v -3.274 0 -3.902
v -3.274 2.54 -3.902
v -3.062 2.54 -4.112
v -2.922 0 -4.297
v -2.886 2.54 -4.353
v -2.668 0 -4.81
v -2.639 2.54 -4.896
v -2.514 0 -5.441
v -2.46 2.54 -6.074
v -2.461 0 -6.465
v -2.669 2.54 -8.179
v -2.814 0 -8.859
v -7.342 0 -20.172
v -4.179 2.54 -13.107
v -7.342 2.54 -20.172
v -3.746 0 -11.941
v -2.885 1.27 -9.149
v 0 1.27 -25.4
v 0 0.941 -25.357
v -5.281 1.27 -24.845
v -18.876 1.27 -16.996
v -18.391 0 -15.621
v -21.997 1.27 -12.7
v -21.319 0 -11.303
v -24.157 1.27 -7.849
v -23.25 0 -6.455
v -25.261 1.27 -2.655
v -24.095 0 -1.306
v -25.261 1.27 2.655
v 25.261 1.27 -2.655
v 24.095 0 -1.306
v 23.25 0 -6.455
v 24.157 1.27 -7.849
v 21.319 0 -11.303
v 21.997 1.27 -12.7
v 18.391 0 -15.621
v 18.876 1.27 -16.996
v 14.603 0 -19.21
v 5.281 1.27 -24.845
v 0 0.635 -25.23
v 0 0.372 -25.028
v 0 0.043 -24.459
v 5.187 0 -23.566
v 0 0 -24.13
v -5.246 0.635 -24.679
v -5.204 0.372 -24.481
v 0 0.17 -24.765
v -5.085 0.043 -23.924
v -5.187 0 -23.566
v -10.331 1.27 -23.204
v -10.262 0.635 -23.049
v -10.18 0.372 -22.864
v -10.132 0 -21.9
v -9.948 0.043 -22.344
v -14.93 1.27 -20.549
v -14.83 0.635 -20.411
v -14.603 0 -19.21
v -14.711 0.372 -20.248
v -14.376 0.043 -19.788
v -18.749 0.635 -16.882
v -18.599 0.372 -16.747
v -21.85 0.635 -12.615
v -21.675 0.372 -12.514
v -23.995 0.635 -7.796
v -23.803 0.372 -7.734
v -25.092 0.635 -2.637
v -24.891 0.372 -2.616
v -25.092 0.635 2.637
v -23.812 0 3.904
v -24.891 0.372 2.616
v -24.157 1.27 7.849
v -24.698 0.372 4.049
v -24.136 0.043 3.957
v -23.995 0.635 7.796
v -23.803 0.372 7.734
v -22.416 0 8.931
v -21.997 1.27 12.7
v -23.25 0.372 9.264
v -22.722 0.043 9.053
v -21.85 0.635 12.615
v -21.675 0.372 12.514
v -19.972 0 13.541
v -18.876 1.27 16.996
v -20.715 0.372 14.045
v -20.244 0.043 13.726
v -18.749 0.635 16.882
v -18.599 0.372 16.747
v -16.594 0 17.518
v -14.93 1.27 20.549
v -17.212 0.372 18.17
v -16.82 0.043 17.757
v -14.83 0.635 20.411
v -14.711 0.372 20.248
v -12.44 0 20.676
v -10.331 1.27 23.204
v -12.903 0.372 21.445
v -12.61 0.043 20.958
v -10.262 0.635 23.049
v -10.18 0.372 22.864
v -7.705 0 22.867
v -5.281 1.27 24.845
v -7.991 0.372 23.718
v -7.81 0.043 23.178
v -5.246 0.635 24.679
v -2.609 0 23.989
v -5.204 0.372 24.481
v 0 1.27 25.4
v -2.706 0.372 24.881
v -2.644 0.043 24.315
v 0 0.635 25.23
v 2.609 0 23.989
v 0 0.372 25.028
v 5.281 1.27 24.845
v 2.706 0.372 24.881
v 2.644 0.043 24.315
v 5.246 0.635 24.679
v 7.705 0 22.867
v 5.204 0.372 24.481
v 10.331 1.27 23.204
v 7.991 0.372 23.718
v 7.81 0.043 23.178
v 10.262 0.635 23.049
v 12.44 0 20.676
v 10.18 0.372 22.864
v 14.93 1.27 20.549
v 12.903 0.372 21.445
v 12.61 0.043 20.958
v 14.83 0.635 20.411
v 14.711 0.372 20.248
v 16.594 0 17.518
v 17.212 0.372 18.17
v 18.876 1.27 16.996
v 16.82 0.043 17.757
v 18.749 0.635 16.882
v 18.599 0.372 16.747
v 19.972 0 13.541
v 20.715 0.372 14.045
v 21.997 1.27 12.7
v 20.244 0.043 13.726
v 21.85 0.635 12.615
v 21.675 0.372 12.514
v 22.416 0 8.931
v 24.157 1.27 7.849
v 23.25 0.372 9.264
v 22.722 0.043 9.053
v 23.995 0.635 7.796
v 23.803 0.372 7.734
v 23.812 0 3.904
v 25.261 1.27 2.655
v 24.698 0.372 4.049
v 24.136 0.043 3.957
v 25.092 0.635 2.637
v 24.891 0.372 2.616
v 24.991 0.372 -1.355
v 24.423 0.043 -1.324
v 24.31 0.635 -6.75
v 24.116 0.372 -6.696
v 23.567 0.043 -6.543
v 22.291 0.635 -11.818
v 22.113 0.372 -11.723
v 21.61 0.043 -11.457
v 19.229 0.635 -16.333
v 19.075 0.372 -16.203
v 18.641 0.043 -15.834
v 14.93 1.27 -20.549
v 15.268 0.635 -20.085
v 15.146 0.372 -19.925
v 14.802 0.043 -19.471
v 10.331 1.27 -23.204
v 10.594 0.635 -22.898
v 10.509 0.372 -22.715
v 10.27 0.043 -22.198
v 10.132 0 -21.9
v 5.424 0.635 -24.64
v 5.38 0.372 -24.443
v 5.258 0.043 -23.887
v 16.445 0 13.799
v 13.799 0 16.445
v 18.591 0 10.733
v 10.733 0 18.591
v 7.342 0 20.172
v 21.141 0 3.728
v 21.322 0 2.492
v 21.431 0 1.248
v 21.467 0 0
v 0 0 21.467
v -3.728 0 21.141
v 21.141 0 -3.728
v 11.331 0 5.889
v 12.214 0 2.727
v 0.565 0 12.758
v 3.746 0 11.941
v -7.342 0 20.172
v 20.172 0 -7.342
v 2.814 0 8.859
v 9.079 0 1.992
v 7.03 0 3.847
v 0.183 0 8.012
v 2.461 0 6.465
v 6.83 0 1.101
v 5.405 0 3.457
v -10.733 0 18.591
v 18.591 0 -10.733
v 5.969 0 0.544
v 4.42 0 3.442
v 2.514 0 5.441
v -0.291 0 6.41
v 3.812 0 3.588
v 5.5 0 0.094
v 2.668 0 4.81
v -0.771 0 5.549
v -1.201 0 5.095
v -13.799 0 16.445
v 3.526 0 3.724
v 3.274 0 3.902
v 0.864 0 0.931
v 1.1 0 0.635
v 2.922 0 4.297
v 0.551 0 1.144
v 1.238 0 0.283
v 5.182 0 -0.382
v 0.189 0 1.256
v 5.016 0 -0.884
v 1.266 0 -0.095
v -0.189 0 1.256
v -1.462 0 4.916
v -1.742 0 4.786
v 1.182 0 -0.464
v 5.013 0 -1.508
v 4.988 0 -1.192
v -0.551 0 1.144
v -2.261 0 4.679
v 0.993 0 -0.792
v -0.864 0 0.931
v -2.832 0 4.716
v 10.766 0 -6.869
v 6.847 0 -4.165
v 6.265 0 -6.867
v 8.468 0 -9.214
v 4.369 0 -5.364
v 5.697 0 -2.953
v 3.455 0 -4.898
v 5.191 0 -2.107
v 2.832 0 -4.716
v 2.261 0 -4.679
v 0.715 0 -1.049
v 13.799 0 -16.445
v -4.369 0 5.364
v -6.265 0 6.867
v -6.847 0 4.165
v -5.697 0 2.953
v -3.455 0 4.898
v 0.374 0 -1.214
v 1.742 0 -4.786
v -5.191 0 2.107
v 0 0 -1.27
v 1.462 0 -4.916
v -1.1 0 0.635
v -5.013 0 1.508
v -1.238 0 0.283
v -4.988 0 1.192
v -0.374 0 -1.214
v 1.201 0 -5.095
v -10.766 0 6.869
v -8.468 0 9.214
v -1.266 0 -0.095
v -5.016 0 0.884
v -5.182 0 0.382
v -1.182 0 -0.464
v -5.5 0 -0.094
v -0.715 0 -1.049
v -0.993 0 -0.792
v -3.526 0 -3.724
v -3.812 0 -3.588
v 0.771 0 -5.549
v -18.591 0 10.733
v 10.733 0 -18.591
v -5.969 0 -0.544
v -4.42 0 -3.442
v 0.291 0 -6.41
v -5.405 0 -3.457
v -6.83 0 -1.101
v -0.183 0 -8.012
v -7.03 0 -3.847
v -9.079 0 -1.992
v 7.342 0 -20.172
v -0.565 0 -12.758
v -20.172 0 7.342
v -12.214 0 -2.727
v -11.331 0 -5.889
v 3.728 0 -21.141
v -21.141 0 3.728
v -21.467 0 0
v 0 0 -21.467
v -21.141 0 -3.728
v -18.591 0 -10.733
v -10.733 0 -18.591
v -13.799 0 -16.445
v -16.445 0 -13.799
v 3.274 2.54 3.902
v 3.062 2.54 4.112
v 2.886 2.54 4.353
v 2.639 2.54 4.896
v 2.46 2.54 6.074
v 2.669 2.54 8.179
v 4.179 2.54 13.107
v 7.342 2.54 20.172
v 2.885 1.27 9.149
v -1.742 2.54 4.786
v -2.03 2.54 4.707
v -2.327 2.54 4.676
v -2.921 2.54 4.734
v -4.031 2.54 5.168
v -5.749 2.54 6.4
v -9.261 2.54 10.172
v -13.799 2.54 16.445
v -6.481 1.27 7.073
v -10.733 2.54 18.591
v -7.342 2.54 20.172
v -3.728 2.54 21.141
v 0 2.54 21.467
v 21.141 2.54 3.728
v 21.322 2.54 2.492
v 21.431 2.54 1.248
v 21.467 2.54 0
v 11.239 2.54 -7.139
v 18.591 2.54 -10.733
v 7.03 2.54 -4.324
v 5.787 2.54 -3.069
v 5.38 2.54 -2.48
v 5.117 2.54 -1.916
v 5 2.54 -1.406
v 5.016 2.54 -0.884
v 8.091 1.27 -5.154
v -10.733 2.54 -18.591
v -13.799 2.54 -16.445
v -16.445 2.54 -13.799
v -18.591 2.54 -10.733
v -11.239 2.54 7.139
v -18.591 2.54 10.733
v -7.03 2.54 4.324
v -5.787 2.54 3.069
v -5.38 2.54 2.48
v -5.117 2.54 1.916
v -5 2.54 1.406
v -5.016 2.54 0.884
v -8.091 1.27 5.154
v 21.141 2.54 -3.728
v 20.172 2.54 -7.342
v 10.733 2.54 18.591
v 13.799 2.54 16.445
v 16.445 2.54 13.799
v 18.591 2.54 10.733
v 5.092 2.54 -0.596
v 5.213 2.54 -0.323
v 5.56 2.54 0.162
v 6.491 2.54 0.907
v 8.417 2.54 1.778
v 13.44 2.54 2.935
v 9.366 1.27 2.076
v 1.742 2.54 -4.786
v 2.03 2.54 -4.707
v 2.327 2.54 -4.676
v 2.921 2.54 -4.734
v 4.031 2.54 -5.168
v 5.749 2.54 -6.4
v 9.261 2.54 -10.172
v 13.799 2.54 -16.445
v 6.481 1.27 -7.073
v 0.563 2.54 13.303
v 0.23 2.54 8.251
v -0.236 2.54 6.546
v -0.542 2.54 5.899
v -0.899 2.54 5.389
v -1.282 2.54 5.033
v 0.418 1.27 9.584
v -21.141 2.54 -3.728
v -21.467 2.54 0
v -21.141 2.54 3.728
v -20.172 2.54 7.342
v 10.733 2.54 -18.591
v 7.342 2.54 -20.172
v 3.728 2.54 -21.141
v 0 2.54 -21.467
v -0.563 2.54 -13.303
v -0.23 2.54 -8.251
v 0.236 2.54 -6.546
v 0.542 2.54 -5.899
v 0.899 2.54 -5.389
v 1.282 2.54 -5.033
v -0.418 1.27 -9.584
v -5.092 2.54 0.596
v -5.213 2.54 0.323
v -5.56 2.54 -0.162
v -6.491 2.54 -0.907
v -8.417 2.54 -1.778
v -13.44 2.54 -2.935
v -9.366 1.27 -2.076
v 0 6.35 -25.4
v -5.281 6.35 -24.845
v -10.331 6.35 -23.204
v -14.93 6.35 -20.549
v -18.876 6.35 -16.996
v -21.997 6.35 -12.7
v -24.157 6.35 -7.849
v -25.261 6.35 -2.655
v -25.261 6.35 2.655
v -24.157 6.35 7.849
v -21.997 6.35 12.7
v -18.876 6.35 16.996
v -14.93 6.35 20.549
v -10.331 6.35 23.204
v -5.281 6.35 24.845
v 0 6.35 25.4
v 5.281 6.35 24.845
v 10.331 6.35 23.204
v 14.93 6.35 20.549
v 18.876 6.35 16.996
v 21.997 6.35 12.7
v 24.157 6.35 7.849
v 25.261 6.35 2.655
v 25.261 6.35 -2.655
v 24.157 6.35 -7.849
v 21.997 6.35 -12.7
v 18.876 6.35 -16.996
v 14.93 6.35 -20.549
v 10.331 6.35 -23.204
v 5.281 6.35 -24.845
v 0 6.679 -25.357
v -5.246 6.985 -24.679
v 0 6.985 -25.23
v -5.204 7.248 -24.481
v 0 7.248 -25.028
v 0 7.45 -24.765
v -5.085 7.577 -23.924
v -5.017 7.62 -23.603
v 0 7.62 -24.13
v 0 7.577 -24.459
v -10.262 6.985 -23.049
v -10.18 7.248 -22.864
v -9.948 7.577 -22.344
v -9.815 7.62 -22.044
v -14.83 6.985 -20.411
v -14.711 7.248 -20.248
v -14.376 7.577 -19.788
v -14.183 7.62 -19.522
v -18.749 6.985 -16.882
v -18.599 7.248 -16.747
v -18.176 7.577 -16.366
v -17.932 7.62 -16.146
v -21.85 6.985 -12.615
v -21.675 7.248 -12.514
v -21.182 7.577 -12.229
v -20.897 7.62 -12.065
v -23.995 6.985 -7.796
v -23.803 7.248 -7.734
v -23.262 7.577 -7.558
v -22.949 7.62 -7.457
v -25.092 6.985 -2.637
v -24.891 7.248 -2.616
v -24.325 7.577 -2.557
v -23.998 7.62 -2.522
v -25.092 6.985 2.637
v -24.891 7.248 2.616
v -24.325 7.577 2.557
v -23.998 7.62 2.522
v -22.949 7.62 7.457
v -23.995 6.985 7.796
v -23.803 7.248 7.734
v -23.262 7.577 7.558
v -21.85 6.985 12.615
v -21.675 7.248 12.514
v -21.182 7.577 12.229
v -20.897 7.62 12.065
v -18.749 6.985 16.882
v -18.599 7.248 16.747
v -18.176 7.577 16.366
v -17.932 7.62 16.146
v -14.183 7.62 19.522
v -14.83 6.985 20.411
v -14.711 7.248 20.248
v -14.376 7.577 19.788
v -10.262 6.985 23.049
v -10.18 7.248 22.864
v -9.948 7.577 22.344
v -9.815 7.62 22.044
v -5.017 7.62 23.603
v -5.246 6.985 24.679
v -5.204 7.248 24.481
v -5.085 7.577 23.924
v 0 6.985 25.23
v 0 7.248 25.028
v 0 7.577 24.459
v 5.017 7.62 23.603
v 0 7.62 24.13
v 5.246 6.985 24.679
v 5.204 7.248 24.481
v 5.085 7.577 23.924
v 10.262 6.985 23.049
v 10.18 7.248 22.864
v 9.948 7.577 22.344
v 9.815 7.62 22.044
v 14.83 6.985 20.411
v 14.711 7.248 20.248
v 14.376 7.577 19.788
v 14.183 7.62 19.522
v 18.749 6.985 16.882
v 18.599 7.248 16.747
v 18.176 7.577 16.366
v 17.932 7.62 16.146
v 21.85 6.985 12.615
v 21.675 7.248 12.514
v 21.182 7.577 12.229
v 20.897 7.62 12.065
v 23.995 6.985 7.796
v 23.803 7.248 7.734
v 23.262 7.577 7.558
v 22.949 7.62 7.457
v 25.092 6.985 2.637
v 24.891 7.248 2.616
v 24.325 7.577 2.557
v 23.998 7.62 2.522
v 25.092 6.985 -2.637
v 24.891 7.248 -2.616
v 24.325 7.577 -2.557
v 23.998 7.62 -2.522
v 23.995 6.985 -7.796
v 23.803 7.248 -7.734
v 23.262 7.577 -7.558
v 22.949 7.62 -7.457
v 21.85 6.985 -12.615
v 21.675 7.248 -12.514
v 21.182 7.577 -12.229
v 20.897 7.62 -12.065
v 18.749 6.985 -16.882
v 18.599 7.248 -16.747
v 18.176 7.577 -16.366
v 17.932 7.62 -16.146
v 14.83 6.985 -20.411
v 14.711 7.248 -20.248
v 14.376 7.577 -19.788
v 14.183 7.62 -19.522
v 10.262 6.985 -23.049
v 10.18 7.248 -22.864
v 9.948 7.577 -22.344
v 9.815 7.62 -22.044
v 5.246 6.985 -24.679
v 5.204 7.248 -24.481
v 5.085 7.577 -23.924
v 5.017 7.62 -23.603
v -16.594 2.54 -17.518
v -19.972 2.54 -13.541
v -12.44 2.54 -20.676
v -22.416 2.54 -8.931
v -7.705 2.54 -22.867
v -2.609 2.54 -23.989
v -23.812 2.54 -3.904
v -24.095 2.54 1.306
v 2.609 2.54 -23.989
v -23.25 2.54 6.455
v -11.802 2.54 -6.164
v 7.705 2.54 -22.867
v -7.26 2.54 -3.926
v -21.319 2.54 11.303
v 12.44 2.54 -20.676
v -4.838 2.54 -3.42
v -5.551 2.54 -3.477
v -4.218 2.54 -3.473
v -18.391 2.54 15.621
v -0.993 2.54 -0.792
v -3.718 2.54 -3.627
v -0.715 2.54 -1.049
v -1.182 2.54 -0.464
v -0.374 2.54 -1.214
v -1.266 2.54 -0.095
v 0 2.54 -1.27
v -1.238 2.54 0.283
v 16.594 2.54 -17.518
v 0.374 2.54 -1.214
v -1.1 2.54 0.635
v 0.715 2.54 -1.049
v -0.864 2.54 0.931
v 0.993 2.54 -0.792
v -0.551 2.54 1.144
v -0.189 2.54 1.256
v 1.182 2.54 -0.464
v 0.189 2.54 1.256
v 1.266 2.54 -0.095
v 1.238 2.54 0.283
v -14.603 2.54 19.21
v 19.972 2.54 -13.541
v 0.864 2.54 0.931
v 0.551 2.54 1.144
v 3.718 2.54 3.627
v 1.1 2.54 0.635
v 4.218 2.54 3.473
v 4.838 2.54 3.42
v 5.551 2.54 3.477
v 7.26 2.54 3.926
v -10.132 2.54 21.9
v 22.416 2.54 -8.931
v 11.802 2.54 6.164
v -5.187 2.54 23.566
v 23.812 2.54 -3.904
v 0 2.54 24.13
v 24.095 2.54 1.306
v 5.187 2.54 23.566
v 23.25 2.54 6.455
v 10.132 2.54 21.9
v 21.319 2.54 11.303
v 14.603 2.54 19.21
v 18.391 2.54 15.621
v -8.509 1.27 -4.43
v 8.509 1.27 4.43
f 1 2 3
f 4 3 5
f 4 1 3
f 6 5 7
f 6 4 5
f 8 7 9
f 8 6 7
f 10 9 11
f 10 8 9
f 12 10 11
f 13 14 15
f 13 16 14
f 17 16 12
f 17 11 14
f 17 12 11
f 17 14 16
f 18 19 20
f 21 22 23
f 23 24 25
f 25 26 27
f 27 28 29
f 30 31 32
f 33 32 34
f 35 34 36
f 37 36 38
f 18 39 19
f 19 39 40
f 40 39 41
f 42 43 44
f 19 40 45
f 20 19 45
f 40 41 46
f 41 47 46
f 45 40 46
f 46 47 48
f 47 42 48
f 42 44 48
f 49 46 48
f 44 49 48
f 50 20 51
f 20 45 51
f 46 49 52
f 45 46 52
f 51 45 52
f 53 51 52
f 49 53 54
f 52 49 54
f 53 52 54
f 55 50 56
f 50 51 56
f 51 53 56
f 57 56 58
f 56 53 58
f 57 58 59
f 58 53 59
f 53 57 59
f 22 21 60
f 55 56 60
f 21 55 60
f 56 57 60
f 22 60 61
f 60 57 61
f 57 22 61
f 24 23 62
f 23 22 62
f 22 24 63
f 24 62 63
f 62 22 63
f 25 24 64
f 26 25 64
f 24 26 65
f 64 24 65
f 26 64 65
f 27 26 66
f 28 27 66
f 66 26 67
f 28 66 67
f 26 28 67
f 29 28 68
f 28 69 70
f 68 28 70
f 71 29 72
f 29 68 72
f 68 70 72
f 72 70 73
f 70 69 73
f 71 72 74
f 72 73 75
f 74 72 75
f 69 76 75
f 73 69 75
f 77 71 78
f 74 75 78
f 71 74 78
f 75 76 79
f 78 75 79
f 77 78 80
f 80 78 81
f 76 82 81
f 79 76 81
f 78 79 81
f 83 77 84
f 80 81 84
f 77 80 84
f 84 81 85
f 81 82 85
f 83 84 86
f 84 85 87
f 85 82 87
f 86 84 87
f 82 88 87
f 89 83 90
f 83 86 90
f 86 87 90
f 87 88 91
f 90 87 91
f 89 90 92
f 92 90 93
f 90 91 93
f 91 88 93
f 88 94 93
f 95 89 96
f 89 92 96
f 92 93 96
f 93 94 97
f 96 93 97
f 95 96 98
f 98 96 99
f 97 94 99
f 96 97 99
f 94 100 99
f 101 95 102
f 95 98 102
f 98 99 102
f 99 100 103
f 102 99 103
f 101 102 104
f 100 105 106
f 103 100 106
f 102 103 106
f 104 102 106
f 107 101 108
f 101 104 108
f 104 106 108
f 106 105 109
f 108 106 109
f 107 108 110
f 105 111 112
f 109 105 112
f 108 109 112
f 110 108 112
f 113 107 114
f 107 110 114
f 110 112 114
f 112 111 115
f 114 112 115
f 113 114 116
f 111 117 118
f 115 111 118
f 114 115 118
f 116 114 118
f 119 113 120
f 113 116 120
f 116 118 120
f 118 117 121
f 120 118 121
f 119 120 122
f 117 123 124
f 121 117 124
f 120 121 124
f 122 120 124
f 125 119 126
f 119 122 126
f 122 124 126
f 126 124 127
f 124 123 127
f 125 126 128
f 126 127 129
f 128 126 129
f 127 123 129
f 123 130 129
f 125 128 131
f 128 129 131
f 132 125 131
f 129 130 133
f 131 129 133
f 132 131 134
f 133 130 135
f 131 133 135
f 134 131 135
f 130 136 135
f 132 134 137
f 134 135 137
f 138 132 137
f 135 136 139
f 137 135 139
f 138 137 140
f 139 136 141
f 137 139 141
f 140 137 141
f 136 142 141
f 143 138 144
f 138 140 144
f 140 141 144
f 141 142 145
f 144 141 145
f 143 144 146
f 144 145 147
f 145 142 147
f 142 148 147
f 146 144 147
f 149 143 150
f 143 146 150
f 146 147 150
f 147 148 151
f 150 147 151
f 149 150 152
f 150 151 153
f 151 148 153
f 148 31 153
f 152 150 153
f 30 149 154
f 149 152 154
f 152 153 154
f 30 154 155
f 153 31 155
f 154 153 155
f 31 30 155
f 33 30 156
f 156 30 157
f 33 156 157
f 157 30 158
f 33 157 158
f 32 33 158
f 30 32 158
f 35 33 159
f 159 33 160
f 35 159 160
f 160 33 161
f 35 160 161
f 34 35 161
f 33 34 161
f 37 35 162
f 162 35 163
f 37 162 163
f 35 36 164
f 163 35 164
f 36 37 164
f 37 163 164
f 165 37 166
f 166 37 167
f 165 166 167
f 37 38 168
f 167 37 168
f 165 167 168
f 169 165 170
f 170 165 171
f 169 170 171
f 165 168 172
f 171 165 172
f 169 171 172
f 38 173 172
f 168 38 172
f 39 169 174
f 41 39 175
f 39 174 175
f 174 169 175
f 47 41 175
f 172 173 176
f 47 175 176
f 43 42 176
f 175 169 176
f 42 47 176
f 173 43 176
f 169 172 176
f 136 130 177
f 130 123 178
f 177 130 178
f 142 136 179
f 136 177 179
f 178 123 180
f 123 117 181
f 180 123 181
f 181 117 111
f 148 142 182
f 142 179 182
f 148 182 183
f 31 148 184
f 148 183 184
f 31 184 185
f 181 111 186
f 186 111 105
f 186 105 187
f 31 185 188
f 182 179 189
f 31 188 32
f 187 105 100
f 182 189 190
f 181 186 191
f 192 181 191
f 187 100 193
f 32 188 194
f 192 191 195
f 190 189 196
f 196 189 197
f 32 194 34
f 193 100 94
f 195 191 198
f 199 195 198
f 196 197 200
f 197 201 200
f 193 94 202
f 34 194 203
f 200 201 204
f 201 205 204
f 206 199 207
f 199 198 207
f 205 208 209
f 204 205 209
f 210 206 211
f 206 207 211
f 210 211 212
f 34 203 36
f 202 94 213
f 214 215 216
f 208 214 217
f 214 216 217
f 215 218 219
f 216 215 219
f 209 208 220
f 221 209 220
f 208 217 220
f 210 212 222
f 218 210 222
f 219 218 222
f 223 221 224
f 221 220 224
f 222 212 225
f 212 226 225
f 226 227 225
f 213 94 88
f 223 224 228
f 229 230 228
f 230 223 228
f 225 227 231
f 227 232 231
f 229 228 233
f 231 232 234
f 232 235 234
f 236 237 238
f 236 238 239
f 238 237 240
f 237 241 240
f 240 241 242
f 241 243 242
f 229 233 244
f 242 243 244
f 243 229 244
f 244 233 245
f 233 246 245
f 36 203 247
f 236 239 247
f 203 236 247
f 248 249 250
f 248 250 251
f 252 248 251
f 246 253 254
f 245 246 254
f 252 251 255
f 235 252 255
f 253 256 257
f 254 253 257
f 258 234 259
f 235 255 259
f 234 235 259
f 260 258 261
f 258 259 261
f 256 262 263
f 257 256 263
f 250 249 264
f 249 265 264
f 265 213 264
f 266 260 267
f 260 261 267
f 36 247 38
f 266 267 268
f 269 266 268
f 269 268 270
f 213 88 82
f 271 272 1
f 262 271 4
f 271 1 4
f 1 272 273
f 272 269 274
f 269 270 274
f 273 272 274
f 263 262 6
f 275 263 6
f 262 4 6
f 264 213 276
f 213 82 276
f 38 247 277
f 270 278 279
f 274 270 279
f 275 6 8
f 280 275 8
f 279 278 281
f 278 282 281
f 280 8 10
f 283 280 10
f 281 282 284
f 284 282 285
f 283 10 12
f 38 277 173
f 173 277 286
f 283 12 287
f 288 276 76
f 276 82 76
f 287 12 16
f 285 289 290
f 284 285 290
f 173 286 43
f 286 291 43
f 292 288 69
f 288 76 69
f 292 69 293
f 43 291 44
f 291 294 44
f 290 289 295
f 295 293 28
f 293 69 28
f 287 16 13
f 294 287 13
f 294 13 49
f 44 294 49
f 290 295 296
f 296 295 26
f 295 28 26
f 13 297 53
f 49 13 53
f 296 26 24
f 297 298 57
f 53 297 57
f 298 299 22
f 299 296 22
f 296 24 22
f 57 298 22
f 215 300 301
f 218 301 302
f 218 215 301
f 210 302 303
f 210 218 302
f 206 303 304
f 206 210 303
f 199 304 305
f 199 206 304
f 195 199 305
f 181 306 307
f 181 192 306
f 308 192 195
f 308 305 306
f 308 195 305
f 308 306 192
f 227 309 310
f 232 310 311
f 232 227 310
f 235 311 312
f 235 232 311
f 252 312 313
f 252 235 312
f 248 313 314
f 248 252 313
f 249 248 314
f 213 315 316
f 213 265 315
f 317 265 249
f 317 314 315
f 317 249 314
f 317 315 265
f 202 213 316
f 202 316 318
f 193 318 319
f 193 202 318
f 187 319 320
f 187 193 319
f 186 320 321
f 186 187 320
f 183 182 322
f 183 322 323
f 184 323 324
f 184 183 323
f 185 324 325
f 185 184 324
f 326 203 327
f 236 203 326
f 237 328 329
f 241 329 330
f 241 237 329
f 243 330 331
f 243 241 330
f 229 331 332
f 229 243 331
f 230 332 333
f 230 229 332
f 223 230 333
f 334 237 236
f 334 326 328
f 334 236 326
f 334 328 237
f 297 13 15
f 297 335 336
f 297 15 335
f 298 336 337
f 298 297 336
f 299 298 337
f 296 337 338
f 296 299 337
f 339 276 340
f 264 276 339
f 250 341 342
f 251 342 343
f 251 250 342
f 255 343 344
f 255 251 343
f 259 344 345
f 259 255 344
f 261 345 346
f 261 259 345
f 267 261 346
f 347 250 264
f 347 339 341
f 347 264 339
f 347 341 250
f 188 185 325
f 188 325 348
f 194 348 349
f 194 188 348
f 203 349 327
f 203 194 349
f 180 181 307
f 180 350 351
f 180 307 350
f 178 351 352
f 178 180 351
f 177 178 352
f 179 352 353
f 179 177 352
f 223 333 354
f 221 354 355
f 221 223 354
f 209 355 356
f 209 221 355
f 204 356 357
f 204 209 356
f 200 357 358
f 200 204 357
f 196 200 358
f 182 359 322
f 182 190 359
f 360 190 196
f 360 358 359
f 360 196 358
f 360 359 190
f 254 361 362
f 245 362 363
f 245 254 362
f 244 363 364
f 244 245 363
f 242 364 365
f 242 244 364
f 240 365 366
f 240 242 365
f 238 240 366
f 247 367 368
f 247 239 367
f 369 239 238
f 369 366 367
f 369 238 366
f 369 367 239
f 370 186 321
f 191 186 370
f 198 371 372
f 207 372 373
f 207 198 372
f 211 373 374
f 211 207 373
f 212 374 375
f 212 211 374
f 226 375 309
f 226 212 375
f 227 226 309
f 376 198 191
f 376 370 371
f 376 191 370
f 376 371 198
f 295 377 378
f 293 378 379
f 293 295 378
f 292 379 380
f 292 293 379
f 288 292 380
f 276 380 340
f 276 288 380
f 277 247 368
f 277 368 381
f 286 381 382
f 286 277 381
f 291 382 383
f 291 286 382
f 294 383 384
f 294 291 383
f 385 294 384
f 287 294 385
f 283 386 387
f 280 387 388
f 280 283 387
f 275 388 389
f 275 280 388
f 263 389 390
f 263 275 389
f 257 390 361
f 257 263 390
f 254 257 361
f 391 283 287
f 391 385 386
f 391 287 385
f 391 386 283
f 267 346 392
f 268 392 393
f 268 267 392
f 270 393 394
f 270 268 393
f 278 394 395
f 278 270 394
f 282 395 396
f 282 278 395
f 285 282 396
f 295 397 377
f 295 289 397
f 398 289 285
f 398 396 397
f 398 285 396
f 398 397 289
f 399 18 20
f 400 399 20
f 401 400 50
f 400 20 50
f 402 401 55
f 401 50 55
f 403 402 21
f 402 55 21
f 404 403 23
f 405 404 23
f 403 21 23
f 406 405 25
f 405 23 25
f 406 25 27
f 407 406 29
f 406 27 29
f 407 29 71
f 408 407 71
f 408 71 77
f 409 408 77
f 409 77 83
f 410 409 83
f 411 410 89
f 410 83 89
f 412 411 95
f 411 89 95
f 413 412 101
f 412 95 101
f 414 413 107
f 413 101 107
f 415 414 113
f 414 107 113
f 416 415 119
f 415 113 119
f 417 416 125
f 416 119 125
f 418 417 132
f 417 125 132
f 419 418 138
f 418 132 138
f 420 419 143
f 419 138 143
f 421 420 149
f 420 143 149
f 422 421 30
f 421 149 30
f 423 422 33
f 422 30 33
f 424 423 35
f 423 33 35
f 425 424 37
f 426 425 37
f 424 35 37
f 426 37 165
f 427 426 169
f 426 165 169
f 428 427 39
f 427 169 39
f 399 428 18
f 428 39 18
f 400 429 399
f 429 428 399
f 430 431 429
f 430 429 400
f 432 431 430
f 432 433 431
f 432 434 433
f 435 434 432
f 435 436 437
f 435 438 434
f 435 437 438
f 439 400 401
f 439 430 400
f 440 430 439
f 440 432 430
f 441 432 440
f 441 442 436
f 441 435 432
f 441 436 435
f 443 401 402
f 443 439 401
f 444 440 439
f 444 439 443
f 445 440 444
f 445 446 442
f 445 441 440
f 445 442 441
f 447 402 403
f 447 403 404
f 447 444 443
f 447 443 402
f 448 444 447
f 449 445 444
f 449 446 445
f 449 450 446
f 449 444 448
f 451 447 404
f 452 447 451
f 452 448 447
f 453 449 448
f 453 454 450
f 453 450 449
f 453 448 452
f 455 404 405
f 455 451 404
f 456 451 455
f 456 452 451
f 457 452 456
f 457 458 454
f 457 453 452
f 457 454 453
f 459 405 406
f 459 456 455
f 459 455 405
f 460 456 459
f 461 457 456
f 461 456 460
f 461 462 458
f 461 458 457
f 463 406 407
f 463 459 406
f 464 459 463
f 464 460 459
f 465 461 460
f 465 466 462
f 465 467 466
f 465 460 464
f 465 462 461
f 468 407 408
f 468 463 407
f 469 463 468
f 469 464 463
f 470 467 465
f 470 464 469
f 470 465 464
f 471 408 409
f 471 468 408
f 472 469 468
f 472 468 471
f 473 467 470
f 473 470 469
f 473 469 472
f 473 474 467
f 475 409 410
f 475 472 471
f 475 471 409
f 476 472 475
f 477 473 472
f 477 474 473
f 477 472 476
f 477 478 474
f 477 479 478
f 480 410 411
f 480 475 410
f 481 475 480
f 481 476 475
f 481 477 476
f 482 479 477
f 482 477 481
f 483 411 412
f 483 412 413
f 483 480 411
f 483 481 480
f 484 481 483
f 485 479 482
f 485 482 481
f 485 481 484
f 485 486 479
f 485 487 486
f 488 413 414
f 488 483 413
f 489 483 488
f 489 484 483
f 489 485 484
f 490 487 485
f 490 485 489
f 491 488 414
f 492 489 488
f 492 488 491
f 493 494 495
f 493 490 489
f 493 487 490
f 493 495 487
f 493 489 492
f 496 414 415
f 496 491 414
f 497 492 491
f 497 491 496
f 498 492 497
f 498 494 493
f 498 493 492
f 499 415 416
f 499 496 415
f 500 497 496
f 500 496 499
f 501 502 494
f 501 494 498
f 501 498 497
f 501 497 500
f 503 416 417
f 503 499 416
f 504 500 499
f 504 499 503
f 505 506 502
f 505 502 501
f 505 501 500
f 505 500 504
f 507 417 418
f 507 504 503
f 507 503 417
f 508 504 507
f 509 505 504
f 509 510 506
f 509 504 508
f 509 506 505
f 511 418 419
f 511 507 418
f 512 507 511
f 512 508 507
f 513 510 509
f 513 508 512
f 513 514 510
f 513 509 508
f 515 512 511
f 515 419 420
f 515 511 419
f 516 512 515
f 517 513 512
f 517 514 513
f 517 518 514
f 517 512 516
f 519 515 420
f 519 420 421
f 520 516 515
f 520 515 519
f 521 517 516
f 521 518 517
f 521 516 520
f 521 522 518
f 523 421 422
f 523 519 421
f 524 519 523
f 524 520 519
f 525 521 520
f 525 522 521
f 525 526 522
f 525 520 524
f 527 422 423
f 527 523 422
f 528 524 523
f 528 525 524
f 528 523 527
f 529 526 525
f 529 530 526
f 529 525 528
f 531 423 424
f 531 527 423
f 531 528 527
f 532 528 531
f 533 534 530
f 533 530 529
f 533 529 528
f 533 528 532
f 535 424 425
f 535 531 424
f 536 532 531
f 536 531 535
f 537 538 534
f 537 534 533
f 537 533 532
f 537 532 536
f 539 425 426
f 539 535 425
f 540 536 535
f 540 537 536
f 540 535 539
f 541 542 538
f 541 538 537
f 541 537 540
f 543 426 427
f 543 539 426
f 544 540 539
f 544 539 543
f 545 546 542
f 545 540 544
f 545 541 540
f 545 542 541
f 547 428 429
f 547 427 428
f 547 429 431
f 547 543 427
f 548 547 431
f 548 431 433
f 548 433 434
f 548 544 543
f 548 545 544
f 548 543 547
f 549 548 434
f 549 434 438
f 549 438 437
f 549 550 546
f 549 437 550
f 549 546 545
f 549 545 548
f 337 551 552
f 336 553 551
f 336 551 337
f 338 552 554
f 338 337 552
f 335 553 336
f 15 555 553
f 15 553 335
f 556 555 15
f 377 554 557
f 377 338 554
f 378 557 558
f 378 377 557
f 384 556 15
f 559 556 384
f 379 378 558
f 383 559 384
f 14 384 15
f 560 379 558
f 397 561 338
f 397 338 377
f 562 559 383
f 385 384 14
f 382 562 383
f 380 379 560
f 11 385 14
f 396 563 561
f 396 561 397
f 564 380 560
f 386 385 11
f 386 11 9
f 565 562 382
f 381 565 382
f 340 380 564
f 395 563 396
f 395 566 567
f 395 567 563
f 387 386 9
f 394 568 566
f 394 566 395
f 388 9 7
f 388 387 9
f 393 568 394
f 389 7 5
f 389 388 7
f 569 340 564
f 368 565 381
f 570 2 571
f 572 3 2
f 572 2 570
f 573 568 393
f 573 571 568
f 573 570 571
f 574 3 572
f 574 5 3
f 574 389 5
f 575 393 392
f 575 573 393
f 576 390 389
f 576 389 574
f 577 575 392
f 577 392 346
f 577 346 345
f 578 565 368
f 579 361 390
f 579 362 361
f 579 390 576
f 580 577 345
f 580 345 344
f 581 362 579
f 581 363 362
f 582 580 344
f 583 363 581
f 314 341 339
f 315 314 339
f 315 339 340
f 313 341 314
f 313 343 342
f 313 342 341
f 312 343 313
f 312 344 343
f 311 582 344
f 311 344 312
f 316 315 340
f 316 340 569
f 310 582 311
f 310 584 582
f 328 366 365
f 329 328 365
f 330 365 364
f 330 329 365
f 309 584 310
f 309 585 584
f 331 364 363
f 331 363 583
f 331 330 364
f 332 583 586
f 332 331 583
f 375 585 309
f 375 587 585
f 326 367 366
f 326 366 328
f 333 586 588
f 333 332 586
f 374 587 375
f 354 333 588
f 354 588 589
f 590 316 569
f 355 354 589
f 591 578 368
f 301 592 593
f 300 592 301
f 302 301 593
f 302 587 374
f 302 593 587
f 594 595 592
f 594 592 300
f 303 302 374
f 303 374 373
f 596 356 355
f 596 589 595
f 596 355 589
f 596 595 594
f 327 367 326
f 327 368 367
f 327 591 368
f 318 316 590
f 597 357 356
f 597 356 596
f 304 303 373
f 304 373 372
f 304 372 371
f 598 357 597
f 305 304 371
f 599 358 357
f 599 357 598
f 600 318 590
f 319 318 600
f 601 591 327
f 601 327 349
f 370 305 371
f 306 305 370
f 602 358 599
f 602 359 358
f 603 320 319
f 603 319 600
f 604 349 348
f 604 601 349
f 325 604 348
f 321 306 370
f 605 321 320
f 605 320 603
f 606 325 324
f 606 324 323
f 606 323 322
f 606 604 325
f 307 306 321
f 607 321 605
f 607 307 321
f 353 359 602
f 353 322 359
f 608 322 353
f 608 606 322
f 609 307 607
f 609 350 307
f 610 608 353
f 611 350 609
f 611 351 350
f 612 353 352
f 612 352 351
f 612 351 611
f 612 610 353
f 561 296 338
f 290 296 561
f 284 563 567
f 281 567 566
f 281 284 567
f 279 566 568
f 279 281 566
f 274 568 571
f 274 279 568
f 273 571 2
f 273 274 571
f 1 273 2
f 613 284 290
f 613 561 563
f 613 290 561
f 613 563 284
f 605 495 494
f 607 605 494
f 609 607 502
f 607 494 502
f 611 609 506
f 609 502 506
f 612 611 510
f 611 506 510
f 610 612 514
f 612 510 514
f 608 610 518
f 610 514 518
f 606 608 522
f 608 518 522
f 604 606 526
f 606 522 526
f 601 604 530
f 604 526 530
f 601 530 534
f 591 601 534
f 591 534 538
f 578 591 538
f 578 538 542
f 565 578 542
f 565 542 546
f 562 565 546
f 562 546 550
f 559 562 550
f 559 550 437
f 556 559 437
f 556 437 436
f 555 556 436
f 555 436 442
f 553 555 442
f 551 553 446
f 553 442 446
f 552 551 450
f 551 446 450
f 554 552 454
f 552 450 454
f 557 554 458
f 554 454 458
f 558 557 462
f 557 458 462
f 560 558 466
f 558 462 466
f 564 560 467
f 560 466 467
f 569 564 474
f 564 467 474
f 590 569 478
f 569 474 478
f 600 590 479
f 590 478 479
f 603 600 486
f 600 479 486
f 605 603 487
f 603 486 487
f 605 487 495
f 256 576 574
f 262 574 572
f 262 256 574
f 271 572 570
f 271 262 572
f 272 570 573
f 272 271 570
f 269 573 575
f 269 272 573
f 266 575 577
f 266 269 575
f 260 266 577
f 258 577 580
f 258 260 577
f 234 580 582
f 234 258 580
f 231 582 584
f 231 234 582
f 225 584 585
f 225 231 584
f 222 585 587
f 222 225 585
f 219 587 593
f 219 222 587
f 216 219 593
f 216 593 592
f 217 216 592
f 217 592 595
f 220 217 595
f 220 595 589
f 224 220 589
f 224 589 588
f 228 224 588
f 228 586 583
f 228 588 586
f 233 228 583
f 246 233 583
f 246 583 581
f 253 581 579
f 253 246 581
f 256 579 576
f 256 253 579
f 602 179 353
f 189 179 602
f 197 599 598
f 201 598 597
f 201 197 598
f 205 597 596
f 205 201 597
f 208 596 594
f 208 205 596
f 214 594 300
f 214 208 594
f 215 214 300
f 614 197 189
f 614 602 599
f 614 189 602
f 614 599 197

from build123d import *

# Parameters (mm, degrees)
SKETCH1_R           = 25.4
BOSS_EXTRUDE2_DEPTH = 7.62
CUT_EXTRUDE2_DEPTH  = 47.498
SKETCH1_5_R         = 1.27
CUT_EXTRUDE5_DEPTH  = 61.214
FILLET3_R           = 1.27
FILLET4_R           = 1.27
SKETCH9_R           = 24.13
CUT_EXTRUDE7_DEPTH  = 5.08


with BuildPart() as part:
    # Sketch1 → Boss-Extrude2 (new body)
    with BuildSketch(Plane(origin=(0, 0, 0), x_dir=(1, 0, 0), z_dir=(0, 1, 0))):
        Circle(SKETCH1_R)
    extrude(amount=BOSS_EXTRUDE2_DEPTH)

    # Sketch1<4> → Cut-Extrude2 (cut)
    with BuildSketch(Plane(origin=(0, 0, 0), x_dir=(1, 0, 0), z_dir=(0, 1, 0))):
        with BuildLine():
            ThreePointArc((21.140811888, -3.72769553), (21.140811888, 3.72769553), (18.590917969, 10.733471494))
            add(Edge.make_bspline(
                [(18.590917969, 10.733471494), (-9.834419754, -1.734073542), (21.140811888, -3.72769553)],
                knots=[0, 0, 0, 1, 1, 1], degree=2))
        make_face()
        with BuildLine():
            add(Edge.make_bspline(
                [(0, 21.466942988), (-3.415458137, -9.38389411), (13.79868497, 16.444632387)],
                knots=[0, 0, 0, 1, 1, 1], degree=2))
            ThreePointArc((13.79868497, 16.444632387), (7.342126917, 20.172327916), (0, 21.466942988))
        make_face()
        with BuildLine():
            ThreePointArc((7.342126917, -20.172327916), (13.79868497, -16.444632387), (18.590917969, -10.733471494))
            add(Edge.make_bspline(
                [(18.590917969, -10.733471494), (-6.418961617, 7.649820567), (7.342126917, -20.172327916)],
                knots=[0, 0, 0, 1, 1, 1], degree=2))
        make_face()
        with BuildLine():
            add(Edge.make_bspline(
                [(-18.590917969, 10.733471494), (6.418961617, -7.649820567), (-7.342126917, 20.172327916)],
                knots=[0, 0, 0, 1, 1, 1], degree=2))
            ThreePointArc((-7.342126917, 20.172327916), (-13.79868497, 16.444632387), (-18.590917969, 10.733471494))
        make_face()
        with BuildLine():
            ThreePointArc((-13.79868497, -16.444632387), (-7.342126917, -20.172327916), (0, -21.466942988))
            add(Edge.make_bspline(
                [(0, -21.466942988), (3.415458137, 9.38389411), (-13.79868497, -16.444632387)],
                knots=[0, 0, 0, 1, 1, 1], degree=2))
        make_face()
        with BuildLine():
            add(Edge.make_bspline(
                [(-18.590917969, -10.733471494), (9.834419754, 1.734073542), (-21.140811888, 3.72769553)],
                knots=[0, 0, 0, 1, 1, 1], degree=2))
            ThreePointArc((-21.140811888, 3.72769553), (-21.140811888, -3.72769553), (-18.590917969, -10.733471494))
        make_face()
    extrude(amount=CUT_EXTRUDE2_DEPTH, mode=Mode.SUBTRACT)

    # Sketch1<5> → Cut-Extrude5 (cut)
    with BuildSketch(Plane(origin=(0, 0, 0), x_dir=(1, 0, 0), z_dir=(0, 1, 0))):
        Circle(SKETCH1_5_R)
    extrude(amount=CUT_EXTRUDE5_DEPTH, mode=Mode.SUBTRACT)

    # Fillet3
    fillet3_edges = [part.edges().sort_by_distance(p)[0] for p in [
        (-25.4, 0, 0),
    ]]
    fillet(fillet3_edges, radius=FILLET3_R)

    # Fillet4
    fillet4_edges = [part.edges().sort_by_distance(p)[0] for p in [
        (-25.4, 7.62, 0),
    ]]
    fillet(fillet4_edges, radius=FILLET4_R)

    # Sketch9 → Cut-Extrude7 (cut)
    with BuildSketch(Plane(origin=(0, 7.62, 0), x_dir=(1, 0, 0), z_dir=(0, 1, 0))):
        Circle(SKETCH9_R)
    extrude(amount=-CUT_EXTRUDE7_DEPTH, mode=Mode.SUBTRACT)


solid = part.part
